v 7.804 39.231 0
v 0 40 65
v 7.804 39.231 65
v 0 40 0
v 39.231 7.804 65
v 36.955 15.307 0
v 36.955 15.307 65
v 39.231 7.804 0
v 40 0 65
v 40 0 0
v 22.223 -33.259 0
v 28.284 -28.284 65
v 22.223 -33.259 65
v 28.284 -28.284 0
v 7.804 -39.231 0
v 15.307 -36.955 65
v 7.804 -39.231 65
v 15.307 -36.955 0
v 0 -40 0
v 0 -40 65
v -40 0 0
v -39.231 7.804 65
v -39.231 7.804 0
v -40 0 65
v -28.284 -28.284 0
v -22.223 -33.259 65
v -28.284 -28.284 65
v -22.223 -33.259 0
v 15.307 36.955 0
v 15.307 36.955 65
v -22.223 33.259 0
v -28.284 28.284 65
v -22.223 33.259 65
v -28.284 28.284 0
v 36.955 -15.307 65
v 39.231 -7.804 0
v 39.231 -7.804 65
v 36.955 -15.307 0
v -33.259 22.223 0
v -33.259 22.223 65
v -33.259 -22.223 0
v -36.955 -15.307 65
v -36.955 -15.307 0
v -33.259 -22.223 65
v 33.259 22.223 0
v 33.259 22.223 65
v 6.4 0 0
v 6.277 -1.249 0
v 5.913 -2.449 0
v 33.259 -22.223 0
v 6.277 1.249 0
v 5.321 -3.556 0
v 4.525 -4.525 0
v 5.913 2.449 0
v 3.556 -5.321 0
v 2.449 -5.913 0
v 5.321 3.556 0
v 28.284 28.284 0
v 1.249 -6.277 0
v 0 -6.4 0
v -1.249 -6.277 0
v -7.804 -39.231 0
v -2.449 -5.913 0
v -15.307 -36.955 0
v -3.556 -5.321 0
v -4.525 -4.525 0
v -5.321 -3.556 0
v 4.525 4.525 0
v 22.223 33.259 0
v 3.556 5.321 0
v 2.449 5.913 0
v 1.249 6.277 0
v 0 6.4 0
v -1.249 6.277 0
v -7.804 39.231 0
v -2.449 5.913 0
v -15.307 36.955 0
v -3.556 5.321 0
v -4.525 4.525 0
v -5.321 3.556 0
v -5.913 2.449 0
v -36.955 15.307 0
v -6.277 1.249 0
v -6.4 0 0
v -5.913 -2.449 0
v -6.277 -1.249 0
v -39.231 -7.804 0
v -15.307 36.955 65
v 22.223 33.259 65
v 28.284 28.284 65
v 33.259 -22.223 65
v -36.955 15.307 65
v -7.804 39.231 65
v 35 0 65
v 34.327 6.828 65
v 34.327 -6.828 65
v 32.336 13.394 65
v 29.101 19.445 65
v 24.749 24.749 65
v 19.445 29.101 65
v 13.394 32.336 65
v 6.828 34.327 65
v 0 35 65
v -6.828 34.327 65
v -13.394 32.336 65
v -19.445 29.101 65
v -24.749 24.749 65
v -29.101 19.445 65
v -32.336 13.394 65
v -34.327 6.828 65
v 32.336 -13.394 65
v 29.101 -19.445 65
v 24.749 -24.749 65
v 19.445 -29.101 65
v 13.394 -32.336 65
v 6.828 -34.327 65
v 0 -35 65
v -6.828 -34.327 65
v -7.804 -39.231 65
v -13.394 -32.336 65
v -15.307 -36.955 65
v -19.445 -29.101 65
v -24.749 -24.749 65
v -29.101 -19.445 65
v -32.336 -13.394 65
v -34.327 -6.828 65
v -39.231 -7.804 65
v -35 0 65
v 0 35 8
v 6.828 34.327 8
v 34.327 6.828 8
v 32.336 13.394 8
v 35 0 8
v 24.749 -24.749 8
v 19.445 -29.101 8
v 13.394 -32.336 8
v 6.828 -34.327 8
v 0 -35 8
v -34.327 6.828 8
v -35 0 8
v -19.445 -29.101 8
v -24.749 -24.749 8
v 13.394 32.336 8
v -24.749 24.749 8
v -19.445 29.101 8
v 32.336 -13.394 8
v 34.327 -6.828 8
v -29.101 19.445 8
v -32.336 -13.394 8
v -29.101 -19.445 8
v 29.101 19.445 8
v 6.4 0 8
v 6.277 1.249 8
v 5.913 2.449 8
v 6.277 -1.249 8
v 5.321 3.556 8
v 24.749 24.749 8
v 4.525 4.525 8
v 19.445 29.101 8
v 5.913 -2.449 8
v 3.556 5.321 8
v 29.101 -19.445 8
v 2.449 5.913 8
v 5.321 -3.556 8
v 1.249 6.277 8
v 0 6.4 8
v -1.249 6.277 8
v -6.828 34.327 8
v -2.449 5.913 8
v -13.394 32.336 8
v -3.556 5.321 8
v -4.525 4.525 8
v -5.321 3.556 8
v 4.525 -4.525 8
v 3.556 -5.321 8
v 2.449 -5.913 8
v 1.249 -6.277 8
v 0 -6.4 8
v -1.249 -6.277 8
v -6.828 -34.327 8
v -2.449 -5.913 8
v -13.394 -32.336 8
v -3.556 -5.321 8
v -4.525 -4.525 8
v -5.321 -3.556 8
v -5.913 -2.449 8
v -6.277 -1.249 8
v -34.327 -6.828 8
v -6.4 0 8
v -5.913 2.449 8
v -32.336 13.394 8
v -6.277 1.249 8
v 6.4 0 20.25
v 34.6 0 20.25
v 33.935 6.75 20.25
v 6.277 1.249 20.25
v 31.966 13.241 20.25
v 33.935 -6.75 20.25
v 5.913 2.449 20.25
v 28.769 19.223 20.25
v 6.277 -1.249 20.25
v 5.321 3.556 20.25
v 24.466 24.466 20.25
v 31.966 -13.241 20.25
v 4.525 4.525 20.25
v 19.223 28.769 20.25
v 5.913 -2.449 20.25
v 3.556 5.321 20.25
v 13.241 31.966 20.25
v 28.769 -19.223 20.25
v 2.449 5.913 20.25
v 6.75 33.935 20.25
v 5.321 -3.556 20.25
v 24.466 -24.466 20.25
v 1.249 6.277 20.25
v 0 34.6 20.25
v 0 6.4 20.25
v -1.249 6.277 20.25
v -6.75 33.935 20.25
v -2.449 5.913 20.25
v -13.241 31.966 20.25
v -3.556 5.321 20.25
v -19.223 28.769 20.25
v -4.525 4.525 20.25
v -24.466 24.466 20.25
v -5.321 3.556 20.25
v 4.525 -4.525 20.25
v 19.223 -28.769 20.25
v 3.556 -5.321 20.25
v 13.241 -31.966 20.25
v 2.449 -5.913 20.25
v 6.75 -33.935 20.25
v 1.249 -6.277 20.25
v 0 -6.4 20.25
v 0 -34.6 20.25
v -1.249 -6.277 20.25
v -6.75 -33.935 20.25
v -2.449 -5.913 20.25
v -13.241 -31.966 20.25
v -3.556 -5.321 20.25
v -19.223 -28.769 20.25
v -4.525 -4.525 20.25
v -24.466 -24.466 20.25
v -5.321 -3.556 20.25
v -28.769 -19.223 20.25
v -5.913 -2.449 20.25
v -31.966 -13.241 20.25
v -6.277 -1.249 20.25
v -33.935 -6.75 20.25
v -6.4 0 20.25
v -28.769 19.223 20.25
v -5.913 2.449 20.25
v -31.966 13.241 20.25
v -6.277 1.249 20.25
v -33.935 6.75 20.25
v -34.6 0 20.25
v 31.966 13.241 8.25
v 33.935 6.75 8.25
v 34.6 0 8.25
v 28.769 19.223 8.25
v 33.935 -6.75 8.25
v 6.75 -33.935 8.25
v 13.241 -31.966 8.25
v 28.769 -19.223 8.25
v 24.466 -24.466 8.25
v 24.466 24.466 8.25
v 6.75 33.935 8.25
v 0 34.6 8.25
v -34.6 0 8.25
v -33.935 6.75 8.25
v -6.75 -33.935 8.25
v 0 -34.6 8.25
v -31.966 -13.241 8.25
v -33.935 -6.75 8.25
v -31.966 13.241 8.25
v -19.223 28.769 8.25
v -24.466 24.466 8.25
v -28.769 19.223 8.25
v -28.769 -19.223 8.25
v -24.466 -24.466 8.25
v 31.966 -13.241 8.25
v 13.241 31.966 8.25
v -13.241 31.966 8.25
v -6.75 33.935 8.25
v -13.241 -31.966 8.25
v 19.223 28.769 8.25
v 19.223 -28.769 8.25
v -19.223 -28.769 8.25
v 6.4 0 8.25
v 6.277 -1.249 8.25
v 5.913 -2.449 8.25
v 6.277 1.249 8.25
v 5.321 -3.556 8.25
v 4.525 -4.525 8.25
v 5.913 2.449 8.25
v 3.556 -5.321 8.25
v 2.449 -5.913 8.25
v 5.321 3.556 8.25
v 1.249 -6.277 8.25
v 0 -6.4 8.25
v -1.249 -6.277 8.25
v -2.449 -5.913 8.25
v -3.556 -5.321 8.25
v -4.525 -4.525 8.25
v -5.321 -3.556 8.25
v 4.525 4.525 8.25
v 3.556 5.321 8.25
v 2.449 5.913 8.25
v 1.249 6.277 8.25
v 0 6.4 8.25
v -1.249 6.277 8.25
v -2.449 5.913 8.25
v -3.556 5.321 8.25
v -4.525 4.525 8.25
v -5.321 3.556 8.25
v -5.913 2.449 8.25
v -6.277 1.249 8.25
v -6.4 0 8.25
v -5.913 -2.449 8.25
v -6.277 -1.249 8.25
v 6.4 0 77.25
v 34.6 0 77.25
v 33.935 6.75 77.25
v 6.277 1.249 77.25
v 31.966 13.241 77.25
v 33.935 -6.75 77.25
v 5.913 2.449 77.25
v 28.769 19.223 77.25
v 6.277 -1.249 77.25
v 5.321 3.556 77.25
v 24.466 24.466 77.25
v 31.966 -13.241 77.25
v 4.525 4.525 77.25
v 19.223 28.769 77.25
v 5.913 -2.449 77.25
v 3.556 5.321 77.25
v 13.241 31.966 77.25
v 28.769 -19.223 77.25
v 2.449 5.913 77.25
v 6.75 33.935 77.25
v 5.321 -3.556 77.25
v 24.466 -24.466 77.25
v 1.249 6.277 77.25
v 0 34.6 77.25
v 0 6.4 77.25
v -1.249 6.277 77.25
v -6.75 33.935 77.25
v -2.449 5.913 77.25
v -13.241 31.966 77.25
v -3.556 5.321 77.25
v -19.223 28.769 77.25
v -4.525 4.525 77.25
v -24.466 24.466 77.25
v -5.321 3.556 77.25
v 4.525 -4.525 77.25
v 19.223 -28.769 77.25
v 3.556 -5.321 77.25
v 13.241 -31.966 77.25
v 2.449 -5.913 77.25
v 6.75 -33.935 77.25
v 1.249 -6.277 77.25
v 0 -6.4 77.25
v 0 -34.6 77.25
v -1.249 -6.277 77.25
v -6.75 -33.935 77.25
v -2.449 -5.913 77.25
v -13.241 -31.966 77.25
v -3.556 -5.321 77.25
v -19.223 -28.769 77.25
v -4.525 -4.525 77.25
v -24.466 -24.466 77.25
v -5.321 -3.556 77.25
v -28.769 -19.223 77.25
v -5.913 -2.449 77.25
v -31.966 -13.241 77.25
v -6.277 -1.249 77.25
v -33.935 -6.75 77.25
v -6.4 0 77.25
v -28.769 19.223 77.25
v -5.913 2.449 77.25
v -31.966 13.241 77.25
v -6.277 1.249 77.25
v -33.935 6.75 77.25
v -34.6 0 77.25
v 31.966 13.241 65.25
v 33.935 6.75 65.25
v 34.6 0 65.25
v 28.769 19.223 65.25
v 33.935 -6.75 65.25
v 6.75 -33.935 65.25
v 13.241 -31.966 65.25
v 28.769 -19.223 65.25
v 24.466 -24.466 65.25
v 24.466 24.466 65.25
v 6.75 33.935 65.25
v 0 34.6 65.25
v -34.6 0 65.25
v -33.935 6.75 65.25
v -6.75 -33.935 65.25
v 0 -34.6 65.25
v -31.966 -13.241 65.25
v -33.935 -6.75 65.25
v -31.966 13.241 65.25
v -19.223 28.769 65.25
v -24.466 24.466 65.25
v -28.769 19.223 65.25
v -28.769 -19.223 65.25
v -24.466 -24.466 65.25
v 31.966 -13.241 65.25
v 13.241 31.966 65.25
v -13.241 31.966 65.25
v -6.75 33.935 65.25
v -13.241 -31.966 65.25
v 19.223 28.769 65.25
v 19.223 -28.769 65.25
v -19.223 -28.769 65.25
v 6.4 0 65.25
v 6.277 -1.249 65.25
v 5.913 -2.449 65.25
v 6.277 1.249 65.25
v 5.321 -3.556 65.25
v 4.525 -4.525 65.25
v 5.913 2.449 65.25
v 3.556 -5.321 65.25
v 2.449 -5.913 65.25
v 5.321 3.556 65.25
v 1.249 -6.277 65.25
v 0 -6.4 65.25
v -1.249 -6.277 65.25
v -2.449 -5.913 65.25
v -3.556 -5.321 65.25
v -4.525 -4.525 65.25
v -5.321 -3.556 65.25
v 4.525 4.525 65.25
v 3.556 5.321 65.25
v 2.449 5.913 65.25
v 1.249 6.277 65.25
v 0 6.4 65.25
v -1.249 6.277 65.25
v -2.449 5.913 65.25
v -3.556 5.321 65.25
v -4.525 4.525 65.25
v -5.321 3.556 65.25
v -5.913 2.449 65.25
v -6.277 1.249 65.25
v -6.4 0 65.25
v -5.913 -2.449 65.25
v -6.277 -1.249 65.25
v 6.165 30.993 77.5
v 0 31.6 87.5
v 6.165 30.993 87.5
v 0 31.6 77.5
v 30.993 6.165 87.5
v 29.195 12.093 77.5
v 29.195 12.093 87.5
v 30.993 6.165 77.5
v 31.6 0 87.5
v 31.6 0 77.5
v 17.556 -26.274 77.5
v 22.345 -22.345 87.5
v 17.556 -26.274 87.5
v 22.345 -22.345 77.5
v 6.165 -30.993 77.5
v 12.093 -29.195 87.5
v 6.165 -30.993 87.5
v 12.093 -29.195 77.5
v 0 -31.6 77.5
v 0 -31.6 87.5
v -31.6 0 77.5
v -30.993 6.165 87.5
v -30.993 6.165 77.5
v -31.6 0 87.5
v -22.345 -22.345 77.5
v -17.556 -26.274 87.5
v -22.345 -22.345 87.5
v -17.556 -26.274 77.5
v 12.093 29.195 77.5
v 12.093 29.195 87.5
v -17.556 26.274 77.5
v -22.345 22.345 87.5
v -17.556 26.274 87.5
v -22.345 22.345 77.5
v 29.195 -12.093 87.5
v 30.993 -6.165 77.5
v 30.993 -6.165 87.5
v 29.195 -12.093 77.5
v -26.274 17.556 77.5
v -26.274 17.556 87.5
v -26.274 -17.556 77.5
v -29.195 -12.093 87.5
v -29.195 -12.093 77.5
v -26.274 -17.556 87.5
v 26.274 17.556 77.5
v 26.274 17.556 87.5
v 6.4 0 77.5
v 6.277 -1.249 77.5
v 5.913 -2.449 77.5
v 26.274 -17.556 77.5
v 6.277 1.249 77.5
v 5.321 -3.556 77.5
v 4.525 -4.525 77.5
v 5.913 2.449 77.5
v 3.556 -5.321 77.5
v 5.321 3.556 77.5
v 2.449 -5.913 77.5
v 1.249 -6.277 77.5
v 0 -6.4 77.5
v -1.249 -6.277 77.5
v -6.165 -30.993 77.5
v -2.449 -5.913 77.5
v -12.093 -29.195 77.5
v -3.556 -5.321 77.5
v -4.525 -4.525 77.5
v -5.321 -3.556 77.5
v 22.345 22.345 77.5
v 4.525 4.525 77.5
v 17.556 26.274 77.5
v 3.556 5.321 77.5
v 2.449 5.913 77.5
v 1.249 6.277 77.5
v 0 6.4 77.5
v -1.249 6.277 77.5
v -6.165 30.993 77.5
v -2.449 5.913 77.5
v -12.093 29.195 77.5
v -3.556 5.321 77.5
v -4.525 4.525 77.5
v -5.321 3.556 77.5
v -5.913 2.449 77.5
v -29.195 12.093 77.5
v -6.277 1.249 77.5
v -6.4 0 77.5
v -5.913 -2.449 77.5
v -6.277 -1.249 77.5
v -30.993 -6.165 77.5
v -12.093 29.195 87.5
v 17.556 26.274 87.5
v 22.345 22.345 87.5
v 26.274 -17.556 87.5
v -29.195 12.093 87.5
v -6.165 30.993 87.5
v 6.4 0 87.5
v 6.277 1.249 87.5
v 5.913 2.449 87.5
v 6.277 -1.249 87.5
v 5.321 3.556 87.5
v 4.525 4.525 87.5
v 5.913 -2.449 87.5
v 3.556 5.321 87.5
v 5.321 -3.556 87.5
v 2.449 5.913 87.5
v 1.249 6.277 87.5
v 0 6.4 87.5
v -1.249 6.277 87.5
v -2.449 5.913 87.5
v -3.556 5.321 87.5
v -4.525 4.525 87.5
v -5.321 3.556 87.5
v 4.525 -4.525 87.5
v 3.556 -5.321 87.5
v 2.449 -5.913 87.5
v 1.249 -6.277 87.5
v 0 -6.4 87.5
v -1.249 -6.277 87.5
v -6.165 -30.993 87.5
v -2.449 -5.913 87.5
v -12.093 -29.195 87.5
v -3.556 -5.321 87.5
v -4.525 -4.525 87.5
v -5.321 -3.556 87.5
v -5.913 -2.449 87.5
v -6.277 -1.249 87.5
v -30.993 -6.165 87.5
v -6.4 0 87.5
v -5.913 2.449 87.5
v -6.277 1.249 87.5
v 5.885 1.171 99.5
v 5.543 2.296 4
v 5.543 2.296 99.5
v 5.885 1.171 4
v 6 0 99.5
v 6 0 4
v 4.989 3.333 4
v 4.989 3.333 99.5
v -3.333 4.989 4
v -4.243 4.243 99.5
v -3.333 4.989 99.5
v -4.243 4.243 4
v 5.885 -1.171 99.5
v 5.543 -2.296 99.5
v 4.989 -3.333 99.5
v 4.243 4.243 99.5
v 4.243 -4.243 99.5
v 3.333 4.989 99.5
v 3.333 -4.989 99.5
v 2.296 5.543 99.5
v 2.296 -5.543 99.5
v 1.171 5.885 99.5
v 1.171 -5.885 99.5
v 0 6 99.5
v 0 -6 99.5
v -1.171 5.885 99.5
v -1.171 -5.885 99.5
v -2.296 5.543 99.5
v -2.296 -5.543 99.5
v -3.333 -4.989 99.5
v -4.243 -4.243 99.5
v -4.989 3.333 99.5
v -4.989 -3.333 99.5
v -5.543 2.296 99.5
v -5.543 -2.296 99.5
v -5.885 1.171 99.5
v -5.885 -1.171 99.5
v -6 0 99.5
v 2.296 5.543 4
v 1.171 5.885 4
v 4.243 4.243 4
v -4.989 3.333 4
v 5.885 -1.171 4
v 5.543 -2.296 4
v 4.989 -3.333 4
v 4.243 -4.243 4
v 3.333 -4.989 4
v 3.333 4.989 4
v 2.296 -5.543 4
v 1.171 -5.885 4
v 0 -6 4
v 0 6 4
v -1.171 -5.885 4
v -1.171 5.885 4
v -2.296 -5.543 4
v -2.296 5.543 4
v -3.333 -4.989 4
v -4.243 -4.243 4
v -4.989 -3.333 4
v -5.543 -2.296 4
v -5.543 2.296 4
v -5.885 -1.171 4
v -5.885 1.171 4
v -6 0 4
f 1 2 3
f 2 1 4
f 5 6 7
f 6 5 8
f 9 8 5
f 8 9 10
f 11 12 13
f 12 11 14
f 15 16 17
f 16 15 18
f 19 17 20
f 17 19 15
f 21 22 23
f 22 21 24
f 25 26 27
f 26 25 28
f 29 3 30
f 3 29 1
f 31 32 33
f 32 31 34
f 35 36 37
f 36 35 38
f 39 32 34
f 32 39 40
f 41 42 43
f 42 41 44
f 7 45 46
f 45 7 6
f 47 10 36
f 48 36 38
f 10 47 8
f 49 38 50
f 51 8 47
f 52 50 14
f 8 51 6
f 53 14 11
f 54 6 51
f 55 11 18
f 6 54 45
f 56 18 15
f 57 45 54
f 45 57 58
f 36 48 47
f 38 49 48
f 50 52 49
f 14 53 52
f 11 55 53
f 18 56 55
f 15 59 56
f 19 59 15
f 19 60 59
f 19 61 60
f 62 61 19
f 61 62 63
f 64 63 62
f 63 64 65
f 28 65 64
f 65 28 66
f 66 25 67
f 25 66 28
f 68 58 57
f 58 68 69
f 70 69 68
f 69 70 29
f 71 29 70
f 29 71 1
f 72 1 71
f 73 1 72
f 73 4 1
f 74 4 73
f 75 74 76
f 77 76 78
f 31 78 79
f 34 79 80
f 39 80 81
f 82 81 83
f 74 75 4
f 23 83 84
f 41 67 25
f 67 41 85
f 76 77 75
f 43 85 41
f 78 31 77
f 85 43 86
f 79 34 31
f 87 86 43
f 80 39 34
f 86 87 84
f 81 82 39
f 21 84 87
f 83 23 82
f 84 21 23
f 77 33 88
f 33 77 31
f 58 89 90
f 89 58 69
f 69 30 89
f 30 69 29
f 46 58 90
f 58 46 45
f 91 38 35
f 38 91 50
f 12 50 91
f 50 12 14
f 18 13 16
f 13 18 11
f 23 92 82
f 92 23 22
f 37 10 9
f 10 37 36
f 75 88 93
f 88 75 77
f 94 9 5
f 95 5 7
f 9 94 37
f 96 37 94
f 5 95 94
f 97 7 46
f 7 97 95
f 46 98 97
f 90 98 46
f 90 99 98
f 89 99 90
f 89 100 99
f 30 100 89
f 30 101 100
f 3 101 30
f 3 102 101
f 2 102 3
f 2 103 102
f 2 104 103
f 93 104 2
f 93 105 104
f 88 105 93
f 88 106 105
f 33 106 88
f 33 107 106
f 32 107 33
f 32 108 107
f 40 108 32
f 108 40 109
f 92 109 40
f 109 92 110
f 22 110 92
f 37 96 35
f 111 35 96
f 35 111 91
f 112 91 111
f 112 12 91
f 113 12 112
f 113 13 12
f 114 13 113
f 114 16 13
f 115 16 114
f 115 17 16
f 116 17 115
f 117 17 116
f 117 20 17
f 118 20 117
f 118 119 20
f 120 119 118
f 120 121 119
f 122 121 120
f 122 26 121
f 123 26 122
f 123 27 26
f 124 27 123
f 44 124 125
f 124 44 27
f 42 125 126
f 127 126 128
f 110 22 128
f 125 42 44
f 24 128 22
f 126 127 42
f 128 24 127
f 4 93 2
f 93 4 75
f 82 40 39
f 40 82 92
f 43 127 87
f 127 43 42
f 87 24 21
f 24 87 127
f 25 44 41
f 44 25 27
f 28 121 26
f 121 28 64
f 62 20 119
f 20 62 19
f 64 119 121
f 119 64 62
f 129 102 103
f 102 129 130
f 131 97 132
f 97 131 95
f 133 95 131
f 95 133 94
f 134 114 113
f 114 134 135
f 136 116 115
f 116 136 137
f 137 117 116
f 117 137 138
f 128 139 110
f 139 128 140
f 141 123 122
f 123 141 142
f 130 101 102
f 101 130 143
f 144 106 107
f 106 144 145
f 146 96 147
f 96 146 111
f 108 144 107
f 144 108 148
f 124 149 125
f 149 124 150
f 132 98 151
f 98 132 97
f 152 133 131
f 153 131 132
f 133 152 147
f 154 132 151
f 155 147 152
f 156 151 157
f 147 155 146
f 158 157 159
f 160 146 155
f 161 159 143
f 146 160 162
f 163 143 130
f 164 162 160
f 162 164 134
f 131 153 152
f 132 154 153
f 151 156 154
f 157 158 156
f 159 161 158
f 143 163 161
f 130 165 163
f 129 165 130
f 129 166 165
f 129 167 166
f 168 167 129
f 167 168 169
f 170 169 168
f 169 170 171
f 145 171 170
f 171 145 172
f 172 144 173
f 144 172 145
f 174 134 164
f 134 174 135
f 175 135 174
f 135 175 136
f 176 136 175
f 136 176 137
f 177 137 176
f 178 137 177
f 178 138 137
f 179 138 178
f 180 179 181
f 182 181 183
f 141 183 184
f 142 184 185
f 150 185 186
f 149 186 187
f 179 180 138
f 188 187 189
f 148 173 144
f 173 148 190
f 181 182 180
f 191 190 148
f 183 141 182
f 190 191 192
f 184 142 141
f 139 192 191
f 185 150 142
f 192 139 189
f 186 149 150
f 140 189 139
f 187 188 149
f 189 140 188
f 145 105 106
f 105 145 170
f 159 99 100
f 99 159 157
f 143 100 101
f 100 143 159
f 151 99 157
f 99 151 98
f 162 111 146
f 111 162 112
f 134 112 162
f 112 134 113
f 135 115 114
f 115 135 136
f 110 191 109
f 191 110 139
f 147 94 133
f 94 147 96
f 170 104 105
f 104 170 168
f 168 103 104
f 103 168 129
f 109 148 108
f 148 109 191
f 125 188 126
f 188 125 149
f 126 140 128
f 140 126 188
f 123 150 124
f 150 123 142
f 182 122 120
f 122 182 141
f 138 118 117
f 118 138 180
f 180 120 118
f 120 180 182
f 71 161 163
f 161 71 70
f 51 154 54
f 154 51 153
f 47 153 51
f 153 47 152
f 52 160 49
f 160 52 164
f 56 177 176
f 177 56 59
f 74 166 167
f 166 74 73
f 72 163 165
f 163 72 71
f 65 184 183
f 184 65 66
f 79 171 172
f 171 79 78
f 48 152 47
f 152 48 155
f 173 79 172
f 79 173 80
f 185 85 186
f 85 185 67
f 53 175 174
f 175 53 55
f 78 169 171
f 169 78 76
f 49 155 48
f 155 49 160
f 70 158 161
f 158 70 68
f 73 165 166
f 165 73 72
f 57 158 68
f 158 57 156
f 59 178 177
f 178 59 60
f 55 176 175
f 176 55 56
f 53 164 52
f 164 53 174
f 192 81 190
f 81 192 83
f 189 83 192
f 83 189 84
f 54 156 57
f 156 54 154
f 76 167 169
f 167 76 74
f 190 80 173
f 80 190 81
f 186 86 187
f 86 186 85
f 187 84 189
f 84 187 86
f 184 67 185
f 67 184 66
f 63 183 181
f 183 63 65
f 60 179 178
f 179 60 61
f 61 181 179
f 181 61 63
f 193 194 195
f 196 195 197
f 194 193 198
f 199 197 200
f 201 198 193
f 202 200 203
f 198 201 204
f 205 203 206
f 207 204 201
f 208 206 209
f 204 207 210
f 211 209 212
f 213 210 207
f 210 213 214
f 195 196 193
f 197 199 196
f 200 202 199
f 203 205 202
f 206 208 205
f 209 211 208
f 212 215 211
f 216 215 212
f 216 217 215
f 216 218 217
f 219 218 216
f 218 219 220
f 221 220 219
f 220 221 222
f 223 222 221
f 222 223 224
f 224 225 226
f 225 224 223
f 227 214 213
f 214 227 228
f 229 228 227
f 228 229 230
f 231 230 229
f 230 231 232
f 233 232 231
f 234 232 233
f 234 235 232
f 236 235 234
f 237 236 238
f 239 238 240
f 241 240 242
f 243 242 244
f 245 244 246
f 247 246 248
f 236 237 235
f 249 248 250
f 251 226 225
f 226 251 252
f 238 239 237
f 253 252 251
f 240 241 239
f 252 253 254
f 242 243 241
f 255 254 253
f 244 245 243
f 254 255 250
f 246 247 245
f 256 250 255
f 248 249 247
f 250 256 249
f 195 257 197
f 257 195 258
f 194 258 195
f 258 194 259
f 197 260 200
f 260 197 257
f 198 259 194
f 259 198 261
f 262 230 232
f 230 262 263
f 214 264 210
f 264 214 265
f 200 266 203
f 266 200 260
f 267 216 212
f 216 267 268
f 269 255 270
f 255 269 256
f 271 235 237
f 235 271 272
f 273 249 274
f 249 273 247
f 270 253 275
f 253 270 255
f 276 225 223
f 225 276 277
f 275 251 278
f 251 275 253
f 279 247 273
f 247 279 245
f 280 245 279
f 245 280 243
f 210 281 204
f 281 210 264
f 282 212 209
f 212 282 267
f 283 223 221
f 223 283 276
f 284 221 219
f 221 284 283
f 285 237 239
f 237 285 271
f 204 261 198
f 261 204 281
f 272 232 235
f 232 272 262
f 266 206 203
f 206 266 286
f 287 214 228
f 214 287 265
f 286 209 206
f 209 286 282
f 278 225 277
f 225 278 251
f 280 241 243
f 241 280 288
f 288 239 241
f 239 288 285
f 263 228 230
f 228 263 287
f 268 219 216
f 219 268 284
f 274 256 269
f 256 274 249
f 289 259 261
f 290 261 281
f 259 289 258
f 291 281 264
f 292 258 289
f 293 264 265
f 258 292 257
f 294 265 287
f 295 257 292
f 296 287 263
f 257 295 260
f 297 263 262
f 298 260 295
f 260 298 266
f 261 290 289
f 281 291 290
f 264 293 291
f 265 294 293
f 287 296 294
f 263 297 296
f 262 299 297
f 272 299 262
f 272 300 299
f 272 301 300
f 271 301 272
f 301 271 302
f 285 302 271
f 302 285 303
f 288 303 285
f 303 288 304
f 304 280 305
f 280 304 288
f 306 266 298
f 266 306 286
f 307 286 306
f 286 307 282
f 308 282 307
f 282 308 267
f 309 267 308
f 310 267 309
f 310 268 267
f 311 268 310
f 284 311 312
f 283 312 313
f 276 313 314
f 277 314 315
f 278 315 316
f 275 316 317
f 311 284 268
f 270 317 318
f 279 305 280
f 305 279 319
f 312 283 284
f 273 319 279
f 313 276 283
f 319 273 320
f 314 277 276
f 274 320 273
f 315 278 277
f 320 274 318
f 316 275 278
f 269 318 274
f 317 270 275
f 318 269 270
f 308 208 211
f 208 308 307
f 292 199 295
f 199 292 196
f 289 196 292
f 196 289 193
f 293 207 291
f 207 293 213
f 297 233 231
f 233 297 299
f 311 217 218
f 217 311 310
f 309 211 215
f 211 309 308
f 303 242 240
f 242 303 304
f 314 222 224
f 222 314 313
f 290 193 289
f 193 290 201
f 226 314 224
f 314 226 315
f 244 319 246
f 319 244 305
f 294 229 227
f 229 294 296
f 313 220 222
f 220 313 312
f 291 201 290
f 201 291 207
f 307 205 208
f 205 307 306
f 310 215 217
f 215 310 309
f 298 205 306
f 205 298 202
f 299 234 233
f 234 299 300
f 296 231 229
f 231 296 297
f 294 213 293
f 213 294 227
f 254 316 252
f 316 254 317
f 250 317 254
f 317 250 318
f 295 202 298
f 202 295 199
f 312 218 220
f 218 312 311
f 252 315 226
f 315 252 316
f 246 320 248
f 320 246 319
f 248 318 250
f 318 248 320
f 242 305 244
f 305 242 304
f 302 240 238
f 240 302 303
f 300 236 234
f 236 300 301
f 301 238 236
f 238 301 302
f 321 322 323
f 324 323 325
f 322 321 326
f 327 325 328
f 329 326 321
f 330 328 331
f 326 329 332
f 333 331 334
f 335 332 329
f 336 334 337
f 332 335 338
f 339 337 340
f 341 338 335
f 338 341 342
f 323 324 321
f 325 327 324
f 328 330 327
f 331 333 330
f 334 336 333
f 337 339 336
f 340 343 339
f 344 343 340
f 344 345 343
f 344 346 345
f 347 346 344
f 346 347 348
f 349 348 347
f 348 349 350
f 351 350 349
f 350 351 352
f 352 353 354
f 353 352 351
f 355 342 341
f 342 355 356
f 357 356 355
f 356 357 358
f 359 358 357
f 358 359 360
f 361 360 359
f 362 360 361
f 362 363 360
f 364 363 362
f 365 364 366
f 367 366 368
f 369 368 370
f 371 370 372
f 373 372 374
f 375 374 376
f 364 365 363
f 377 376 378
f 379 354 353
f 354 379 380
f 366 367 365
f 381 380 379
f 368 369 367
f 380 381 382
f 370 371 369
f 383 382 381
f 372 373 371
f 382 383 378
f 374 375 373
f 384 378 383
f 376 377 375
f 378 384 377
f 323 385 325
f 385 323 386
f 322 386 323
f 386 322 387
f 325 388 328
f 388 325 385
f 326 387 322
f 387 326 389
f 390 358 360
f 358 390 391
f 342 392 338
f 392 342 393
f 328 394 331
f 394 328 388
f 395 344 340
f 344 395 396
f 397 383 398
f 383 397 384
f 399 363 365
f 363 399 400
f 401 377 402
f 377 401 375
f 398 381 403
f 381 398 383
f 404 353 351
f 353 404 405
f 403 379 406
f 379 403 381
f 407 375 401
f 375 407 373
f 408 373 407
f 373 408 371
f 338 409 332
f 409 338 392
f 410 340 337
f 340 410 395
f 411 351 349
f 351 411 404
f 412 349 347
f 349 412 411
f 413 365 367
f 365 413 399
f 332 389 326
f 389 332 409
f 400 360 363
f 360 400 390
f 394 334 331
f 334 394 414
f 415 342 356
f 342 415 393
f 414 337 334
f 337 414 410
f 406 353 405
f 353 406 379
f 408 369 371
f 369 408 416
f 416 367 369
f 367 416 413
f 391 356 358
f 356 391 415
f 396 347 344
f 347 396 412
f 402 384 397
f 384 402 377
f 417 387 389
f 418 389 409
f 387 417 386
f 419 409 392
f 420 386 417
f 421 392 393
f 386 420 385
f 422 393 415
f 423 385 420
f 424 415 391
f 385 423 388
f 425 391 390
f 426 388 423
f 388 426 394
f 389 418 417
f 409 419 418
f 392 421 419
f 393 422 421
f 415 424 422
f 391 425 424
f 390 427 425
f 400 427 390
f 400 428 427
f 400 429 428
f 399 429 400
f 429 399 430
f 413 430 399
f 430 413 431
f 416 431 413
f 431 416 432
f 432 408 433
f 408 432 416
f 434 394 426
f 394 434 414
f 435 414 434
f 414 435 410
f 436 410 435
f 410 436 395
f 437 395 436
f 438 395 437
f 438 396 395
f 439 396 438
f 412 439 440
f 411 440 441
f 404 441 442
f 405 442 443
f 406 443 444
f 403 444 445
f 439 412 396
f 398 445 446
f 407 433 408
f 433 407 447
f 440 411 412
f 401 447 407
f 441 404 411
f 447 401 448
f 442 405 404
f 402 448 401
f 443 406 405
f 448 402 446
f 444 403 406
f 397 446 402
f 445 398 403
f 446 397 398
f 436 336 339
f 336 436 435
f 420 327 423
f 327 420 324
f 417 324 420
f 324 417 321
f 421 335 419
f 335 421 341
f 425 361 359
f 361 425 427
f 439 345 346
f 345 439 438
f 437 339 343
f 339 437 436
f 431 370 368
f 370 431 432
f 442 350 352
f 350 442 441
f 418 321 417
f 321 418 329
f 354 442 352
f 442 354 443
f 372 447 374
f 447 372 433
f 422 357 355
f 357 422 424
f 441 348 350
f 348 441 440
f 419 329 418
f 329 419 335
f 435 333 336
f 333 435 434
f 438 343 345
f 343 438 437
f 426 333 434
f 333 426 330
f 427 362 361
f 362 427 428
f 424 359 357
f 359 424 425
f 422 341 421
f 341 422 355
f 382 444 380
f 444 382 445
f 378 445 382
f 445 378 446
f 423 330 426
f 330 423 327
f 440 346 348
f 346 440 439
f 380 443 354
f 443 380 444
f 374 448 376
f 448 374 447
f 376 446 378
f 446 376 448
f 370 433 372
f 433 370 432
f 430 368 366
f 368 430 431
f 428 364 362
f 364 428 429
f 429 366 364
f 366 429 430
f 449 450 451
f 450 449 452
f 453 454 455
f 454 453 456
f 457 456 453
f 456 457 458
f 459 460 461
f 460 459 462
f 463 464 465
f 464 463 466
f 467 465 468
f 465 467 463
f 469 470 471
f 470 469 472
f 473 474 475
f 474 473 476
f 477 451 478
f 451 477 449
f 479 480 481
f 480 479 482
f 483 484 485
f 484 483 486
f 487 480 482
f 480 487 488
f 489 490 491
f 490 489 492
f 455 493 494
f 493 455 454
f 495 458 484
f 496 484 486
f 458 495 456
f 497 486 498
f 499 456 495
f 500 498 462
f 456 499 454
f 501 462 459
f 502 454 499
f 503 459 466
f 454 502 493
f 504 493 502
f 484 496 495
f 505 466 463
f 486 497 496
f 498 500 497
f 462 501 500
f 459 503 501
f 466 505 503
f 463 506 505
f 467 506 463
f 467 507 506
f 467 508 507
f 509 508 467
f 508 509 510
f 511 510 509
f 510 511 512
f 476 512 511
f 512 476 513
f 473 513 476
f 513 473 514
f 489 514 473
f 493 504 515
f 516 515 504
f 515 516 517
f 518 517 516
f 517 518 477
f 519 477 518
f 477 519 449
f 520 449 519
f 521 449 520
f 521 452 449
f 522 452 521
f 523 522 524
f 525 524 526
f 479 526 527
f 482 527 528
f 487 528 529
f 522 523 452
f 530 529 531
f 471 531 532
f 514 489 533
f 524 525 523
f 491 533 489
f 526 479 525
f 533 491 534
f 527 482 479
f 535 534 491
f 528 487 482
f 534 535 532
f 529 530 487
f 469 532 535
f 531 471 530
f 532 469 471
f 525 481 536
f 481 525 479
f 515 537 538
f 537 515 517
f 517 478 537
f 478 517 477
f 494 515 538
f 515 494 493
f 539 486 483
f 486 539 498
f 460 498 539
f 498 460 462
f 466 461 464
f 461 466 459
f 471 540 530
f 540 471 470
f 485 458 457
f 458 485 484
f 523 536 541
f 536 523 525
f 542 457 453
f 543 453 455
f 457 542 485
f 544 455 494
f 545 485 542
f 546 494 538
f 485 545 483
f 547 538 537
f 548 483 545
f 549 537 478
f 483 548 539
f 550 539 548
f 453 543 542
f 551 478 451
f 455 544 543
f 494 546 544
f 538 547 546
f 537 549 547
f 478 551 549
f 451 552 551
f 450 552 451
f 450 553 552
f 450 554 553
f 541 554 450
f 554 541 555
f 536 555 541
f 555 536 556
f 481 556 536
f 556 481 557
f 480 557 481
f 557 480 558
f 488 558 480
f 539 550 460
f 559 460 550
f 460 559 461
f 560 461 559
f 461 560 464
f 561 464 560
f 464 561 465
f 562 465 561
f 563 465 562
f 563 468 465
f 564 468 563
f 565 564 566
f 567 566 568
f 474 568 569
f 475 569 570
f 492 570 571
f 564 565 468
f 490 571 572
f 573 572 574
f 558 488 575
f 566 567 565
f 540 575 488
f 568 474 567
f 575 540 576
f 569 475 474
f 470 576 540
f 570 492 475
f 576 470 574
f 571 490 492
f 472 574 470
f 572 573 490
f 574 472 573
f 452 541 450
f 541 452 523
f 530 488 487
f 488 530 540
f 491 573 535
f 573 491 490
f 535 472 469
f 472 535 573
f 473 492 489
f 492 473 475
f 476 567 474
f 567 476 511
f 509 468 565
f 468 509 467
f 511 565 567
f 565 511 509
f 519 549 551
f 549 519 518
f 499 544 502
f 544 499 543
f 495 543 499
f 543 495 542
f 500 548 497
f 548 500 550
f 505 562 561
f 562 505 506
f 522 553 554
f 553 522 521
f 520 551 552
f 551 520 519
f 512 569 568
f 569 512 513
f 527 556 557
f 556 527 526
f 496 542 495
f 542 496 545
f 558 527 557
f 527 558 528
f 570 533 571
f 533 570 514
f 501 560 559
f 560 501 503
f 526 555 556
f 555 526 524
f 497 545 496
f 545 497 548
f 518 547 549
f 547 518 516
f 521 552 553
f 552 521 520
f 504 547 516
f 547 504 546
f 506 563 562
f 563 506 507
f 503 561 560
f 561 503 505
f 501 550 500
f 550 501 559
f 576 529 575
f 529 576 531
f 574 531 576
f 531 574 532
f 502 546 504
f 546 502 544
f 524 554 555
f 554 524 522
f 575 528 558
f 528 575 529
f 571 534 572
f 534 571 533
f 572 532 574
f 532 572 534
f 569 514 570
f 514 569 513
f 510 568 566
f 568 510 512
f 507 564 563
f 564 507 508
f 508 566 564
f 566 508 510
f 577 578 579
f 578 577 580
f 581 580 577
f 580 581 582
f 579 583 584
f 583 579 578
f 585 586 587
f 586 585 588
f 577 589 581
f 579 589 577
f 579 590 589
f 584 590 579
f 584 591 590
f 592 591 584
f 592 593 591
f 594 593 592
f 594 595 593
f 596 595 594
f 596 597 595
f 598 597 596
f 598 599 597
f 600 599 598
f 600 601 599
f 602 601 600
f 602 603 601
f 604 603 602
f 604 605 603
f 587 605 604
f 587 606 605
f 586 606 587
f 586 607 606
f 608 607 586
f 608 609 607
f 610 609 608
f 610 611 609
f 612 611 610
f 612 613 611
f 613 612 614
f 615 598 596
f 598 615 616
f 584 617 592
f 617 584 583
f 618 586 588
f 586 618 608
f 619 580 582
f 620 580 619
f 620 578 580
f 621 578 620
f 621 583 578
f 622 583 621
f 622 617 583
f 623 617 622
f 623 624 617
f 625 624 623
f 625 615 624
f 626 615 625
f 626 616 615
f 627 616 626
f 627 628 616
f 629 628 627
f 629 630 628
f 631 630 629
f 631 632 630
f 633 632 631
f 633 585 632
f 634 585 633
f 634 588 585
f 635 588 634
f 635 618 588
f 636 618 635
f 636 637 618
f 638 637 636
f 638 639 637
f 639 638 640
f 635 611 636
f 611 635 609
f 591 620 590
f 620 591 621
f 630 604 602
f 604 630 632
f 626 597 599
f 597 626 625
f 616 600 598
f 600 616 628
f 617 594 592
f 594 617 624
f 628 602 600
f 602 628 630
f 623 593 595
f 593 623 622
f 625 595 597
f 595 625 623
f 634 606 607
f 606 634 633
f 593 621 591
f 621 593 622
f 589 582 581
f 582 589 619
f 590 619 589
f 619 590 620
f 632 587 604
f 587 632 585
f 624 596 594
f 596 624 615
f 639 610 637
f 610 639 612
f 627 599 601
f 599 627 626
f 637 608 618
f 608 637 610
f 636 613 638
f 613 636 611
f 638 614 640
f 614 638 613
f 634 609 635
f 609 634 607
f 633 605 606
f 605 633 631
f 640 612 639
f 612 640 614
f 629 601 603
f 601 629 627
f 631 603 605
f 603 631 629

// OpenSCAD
$fn = 32;

// ------------------------------------------------------------------------
// Bearing housing: housing d80, two bearings and a shaft
// Every part is its own module, assembly() places them once.
// ------------------------------------------------------------------------

// --- part 1 ---
module housing() {
  difference() {
    cylinder(h = 65, d = 80);
    translate([0, 0, 8]) cylinder(h = 58, d = 70);
    translate([0, 0, -1]) cylinder(h = 10, d = 12.8);
  }
}

// --- part 2 ---
module bearing_lower() {
  difference() {
      translate([0, 0, 0]) cylinder(h = 12, d = 69.2);
      translate([0, 0, -1]) cylinder(h = 14, d = 12.8);
    }
}

// --- part 3 ---
module bearing_upper() {
  difference() {
      translate([0, 0, 0]) cylinder(h = 12, d = 69.2);
      translate([0, 0, -1]) cylinder(h = 14, d = 12.8);
    }
}

// --- part 4 ---
module spacer() {
  difference() {
      translate([0, 0, 0]) cylinder(h = 10, d = 63.2);
      translate([0, 0, -1]) cylinder(h = 12, d = 12.8);
    }
}

// --- part 5 ---
module shaft() {
  translate([0, 0, -47.75]) cylinder(h = 95.5, d = 12);
}

// --- assembly ---
module assembly() {
  translate([0, 0, 0]) rotate([0, 0, 0]) housing();
  translate([0, 0, 8.25]) rotate([0, 0, 0]) bearing_lower();
  translate([0, 0, 65.25]) rotate([0, 0, 0]) bearing_upper();
  translate([0, 0, 77.5]) rotate([0, 0, 0]) spacer();
  translate([0, 0, 51.75]) rotate([0, 0, 0]) shaft();
}

assembly();
